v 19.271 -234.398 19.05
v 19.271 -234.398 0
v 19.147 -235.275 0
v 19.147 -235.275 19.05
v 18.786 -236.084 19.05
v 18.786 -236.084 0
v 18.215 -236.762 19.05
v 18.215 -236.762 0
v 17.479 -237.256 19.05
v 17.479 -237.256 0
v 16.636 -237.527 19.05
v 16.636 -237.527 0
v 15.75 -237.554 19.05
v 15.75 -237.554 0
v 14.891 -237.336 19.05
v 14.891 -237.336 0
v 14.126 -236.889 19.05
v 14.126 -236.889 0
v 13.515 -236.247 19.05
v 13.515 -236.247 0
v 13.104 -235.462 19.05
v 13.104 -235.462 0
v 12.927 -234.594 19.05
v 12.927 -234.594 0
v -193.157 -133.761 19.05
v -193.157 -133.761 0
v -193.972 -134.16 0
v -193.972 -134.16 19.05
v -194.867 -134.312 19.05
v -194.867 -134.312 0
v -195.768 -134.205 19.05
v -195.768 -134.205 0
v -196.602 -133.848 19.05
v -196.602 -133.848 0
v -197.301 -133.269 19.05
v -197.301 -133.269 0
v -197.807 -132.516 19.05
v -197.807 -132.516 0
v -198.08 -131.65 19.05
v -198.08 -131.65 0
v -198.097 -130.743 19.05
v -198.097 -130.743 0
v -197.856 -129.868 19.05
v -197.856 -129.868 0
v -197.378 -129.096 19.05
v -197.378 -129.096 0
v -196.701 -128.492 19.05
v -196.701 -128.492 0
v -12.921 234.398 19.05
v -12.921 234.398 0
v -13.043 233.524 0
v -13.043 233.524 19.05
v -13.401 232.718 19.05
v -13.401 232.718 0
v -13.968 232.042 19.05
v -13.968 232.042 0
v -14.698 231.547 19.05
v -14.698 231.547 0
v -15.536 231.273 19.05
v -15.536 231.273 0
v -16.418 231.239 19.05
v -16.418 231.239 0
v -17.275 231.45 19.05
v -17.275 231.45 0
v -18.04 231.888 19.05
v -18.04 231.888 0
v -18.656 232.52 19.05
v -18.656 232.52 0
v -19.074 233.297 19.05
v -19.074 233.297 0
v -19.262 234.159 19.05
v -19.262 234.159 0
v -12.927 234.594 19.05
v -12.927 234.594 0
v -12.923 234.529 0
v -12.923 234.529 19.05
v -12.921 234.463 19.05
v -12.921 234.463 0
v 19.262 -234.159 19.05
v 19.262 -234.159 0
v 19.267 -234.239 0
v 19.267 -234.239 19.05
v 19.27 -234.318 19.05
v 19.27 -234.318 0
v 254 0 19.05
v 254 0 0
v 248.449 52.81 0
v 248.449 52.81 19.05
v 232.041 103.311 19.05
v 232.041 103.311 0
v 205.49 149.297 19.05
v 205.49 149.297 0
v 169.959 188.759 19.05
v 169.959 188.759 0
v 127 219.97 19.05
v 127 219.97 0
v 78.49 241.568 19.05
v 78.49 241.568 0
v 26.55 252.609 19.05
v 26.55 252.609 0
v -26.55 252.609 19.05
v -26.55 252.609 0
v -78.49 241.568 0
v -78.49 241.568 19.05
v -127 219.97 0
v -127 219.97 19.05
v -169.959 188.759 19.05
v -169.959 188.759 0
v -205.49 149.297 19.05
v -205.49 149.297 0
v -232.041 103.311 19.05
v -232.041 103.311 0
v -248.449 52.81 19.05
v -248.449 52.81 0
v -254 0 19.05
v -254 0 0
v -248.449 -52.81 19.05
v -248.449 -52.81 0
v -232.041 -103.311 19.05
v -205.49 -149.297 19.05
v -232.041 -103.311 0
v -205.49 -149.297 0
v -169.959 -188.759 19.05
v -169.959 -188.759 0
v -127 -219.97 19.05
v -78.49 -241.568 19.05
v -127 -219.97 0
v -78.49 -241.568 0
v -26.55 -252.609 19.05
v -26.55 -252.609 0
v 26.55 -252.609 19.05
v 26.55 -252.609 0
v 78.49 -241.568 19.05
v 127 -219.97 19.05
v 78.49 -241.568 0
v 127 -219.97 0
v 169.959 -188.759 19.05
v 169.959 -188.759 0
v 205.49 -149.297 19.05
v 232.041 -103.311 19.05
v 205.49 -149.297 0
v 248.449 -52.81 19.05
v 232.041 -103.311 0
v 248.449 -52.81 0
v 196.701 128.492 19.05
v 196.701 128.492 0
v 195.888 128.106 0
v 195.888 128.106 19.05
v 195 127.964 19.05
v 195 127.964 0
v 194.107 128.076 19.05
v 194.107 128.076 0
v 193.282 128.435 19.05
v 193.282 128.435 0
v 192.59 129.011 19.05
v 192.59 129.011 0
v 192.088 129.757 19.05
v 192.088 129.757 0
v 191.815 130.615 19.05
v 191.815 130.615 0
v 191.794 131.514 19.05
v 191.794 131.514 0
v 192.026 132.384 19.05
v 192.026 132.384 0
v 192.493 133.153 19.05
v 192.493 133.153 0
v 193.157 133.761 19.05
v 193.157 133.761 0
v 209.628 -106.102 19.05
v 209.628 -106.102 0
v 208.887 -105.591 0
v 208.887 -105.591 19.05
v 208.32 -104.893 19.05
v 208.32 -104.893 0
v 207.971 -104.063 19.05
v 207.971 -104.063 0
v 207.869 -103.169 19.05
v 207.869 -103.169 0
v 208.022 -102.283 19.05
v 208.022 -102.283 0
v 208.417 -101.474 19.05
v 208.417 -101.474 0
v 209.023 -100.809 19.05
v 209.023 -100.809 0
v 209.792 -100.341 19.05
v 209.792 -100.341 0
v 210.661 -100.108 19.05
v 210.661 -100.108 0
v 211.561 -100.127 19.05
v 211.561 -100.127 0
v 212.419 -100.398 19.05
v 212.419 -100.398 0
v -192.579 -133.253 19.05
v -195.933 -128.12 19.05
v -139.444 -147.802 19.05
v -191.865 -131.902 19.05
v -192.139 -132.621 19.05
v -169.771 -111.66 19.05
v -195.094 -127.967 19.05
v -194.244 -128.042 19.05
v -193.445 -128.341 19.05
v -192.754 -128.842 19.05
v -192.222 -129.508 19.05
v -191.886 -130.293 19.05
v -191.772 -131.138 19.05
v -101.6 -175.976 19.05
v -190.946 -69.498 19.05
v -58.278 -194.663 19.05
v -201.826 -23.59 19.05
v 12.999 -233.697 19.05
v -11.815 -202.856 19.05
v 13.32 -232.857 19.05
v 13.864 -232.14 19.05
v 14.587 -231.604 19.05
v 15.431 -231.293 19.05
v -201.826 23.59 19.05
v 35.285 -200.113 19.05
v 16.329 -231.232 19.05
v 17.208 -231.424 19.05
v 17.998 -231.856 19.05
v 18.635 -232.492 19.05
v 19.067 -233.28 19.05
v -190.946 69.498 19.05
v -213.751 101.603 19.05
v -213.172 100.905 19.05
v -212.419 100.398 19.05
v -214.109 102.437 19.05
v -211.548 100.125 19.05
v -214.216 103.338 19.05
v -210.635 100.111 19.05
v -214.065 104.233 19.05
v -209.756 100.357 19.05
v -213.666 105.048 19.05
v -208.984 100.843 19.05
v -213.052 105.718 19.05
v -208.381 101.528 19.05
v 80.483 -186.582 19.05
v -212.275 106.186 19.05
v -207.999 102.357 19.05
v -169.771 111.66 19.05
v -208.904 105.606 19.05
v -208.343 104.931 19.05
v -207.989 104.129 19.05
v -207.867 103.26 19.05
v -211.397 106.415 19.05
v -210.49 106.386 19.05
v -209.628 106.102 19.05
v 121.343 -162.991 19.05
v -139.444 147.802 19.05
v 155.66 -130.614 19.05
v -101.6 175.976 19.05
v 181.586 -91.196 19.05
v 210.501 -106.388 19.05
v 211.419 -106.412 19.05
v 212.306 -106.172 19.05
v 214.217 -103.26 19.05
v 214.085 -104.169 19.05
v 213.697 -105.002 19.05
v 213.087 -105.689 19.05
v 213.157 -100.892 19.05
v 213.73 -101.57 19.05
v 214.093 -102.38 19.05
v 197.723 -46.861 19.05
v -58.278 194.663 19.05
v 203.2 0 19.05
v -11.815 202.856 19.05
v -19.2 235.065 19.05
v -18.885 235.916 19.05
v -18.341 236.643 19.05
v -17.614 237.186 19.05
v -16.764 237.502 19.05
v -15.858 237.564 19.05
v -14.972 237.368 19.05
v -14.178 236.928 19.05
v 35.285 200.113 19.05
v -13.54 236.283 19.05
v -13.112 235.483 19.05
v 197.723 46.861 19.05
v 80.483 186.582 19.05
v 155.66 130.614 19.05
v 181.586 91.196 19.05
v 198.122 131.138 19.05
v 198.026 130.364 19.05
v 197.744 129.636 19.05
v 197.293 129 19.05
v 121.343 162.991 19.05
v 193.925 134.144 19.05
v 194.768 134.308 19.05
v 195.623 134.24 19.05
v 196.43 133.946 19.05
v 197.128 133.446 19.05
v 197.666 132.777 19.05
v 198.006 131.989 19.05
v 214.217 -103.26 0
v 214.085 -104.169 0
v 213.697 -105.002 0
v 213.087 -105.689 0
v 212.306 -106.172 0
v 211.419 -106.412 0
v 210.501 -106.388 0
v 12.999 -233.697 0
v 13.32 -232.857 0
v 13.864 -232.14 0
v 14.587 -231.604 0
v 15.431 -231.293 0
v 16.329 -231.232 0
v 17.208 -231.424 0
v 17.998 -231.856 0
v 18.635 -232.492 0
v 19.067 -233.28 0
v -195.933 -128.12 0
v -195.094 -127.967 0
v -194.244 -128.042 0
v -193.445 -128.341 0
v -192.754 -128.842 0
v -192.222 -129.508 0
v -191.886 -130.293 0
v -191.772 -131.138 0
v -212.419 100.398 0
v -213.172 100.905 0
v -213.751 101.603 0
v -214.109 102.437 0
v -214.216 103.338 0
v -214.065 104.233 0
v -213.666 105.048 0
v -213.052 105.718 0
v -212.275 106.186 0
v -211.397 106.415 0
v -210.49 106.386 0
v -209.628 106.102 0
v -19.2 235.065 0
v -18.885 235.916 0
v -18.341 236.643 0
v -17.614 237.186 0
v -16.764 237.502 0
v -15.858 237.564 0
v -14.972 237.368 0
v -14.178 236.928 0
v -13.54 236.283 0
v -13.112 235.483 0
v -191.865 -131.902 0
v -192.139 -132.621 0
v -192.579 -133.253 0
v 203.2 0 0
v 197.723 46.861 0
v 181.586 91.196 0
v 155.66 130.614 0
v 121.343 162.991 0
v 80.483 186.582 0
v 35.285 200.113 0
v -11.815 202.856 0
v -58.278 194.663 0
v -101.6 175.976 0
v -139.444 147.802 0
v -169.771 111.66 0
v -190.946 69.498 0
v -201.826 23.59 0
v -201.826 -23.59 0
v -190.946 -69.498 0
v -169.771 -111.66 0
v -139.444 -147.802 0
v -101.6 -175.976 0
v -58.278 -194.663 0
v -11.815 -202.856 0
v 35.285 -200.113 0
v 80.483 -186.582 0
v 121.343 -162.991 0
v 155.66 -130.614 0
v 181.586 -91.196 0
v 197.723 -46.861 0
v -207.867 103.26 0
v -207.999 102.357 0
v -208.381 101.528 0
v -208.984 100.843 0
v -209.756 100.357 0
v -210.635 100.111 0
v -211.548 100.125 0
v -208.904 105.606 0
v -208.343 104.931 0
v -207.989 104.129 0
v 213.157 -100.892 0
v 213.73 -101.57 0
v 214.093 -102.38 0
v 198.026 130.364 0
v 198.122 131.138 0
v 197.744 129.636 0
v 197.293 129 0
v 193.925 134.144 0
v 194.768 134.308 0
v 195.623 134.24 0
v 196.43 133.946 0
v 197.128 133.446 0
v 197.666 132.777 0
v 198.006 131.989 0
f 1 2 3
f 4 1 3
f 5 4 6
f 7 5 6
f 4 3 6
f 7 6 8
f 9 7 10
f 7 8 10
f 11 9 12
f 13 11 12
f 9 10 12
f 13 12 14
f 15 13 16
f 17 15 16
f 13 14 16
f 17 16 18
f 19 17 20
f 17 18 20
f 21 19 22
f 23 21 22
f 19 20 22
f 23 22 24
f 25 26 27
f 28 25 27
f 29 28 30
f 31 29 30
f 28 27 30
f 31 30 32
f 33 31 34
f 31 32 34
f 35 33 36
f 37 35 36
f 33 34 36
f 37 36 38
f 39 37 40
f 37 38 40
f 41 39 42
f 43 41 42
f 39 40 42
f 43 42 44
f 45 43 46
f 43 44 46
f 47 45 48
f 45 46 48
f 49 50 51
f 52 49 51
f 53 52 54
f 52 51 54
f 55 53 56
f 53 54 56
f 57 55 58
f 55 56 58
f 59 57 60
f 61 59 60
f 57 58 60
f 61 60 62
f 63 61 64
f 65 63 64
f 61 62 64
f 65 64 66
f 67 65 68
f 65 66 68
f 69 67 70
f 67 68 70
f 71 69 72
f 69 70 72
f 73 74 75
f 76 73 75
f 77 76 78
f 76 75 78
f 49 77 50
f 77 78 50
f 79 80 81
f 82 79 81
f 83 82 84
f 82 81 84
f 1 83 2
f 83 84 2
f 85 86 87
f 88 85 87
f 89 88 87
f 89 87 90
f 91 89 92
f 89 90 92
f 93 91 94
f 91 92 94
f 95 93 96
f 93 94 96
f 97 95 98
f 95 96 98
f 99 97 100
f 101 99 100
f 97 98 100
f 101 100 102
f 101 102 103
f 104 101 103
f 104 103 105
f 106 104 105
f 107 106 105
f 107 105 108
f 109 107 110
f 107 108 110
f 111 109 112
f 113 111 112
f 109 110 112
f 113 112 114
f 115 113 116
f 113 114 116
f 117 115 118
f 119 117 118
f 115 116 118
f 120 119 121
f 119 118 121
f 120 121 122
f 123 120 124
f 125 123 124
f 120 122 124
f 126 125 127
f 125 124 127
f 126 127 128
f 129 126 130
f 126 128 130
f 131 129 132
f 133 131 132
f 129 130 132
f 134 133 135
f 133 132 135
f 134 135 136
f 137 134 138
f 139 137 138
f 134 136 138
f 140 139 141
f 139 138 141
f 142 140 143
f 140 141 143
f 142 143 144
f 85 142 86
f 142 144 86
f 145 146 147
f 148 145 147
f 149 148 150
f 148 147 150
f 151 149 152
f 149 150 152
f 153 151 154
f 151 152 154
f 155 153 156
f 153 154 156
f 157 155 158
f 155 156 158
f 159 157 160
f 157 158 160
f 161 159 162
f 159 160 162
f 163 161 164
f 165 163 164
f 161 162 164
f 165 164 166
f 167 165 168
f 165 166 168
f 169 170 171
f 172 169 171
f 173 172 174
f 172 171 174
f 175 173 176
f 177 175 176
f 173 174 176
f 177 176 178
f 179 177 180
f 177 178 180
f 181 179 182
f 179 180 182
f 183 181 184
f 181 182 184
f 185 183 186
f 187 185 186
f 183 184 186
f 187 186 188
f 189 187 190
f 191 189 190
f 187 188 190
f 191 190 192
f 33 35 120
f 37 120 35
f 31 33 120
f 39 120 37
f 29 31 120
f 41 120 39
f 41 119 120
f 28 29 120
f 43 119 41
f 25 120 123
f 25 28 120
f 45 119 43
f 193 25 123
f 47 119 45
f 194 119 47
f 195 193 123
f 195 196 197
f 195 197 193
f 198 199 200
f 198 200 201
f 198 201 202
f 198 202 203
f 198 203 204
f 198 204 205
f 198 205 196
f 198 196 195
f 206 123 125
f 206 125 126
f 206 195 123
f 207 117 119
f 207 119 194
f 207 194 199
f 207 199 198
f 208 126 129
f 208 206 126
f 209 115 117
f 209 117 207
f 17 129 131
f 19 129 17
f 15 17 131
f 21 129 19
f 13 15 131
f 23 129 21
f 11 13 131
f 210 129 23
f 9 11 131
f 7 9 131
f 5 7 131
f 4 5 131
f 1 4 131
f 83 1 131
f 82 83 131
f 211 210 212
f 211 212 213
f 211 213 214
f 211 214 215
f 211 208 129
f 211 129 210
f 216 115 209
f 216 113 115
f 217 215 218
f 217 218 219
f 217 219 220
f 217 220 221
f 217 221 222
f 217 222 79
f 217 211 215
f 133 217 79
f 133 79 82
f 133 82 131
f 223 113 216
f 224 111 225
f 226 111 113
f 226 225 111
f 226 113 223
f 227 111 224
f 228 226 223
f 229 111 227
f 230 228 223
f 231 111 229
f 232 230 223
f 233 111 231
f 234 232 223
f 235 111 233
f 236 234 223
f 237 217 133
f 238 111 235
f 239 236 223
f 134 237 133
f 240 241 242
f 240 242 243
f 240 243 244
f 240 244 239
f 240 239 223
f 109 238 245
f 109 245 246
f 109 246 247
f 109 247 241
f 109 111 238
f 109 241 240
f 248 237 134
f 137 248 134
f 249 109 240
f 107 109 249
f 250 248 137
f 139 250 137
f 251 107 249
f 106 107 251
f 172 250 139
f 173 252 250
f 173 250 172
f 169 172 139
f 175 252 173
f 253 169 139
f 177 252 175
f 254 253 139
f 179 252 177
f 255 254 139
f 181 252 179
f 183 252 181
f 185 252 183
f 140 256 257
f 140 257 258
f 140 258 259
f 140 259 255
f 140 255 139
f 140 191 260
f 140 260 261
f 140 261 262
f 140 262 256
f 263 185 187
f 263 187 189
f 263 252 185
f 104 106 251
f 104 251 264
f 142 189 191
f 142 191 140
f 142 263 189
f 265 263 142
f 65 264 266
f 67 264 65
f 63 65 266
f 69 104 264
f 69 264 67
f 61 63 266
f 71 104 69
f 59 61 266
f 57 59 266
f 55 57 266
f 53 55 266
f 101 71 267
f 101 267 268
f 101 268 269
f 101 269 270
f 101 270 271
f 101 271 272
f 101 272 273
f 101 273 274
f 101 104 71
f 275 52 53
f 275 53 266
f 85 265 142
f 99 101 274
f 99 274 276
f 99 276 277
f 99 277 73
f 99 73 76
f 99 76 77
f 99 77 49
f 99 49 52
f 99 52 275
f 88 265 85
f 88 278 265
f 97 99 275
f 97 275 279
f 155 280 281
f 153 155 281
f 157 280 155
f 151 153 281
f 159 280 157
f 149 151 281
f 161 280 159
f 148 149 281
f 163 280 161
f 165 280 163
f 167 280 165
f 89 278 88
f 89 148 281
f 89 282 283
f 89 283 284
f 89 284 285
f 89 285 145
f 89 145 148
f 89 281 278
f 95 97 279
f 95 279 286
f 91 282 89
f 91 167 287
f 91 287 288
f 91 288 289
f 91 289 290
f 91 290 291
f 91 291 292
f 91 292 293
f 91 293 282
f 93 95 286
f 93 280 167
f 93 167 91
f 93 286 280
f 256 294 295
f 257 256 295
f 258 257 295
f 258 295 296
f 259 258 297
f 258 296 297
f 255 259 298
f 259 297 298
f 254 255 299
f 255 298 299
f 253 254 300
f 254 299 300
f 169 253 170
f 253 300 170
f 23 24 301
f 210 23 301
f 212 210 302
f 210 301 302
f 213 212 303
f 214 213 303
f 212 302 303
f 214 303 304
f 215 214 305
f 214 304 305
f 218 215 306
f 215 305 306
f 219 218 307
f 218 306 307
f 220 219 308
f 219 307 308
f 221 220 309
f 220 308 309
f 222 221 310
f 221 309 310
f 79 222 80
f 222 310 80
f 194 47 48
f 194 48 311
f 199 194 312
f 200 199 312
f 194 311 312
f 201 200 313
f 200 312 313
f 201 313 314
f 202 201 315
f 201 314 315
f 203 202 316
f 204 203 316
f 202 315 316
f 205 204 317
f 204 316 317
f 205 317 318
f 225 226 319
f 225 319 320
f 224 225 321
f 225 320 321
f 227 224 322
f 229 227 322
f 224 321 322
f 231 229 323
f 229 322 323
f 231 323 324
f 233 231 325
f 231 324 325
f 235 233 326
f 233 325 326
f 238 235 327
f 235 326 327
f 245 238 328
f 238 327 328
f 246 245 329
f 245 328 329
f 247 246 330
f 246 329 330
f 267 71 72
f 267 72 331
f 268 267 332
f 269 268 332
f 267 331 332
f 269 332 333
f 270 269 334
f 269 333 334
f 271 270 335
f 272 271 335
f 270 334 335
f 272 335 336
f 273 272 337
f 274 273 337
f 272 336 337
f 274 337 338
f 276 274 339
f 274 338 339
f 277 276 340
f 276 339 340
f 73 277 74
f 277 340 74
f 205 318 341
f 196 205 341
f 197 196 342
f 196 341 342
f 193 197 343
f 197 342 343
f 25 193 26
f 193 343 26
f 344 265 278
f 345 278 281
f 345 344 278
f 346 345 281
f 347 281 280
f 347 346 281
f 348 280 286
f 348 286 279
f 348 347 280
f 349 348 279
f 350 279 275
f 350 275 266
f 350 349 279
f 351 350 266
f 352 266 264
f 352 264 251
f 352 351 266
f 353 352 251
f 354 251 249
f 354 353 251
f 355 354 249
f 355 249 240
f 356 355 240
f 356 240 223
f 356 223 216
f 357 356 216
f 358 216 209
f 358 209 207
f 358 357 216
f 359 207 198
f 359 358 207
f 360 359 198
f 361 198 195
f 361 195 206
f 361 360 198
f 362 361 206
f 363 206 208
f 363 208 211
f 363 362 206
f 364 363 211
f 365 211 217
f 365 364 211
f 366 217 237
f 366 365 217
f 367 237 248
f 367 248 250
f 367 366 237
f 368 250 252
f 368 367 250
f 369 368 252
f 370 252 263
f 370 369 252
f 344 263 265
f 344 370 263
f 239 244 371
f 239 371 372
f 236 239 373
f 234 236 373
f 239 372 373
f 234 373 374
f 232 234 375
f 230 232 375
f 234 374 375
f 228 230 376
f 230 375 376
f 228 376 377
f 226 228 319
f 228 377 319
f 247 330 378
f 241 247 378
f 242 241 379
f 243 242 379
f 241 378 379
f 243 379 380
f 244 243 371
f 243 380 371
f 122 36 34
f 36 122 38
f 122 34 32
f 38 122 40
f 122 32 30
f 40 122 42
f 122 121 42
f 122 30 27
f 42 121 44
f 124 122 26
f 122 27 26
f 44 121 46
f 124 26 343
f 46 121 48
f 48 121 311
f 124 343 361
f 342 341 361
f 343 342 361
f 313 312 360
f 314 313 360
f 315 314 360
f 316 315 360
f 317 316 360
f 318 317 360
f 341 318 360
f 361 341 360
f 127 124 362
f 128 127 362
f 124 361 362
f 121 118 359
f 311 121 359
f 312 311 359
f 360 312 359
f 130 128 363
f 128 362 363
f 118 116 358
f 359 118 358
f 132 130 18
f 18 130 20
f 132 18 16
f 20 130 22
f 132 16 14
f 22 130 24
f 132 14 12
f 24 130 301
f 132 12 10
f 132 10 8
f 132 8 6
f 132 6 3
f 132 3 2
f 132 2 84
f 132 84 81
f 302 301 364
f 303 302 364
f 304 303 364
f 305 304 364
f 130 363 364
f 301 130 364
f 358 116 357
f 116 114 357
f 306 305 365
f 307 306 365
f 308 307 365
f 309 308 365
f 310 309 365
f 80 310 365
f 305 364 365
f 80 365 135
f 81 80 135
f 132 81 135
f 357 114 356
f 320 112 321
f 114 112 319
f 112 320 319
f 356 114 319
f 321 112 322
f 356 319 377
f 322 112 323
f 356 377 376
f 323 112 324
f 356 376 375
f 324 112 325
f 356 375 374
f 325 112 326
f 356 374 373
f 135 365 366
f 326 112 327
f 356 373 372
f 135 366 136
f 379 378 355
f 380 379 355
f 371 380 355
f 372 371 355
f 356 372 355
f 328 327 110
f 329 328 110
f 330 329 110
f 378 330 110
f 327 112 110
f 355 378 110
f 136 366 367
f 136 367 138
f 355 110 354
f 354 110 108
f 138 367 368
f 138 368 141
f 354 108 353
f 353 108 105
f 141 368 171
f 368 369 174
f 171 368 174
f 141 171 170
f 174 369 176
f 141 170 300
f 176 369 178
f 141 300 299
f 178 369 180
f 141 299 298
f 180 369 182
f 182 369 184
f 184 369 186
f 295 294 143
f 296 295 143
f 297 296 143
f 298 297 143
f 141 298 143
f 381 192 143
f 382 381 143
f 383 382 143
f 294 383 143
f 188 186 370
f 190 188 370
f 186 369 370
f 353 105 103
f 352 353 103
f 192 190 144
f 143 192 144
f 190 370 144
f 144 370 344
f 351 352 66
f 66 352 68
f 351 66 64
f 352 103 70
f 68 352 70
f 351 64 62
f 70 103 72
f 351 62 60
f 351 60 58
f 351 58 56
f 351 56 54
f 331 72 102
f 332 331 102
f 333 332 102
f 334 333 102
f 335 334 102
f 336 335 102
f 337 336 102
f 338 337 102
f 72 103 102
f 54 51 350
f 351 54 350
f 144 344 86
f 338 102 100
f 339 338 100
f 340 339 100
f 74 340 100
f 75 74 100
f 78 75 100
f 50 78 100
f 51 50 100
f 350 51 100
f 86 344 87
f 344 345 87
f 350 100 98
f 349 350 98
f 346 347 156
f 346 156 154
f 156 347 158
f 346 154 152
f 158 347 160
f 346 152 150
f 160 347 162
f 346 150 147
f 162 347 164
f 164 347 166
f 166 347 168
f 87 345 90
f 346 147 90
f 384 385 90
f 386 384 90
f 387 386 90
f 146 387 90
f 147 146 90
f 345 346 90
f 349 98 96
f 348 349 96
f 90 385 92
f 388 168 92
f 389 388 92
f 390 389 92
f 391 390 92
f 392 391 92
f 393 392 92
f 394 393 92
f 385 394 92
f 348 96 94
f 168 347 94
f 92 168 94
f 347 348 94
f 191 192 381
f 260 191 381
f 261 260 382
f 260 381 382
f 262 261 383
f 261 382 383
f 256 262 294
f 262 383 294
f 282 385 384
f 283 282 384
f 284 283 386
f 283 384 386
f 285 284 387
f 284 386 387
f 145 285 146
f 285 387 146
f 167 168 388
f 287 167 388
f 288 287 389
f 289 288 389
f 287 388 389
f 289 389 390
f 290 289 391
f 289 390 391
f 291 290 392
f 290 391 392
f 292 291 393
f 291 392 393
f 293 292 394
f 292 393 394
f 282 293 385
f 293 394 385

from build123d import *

# Parameters (mm, degrees)
F0_R     = 254
F0_R_2   = 203.2
F1_DEPTH = 19.05


with BuildPart() as f1:
    # F0 (on Top) → F1 (new body)
    with BuildSketch(Plane.XY):
        Circle(F0_R)
        with BuildLine():
            ThreePointArc((196.7011125508, 128.4919251209), (225.1848450649, 67.0319927579), (234.95, 0))
            ThreePointArc((234.95, 0), (229.2479499847, -51.4478369596), (212.4185683948, -100.3984775836))
            ThreePointArc((212.4185683948, -100.3984775836), (213.7303800146, -101.5698688542), (214.2174677682, -103.259766116))
            ThreePointArc((214.2174677682, -103.259766116), (212.7141648851, -105.9590352298), (209.6278276113, -106.1021978612))
            ThreePointArc((209.6278276113, -106.1021978612), (131.1382553066, -194.9468145294), (19.2616521087, -234.1591152572))
            ThreePointArc((19.2616521087, -234.1591152572), (19.2684021583, -234.2784835874), (19.2706532388, -234.3980214226))
            ThreePointArc((19.2706532388, -234.3980214226), (16.1937508526, -237.5715056053), (12.9267150604, -234.5941229821))
            ThreePointArc((12.9267150604, -234.5941229821), (-103.259766116, -211.0424677682), (-193.1569162861, -133.7606376736))
            ThreePointArc((-193.1569162861, -133.7606376736), (-197.5812309419, -132.9103938918), (-196.7011125508, -128.4919251209))
            ThreePointArc((-196.7011125508, -128.4919251209), (-234.3980214226, -16.0956532388), (-212.4185683948, 100.3984775836))
            ThreePointArc((-212.4185683948, 100.3984775836), (-213.8943930083, 104.6551683608), (-209.6278276113, 106.1021978612))
            ThreePointArc((-209.6278276113, 106.1021978612), (-131.1382553066, 194.9468145294), (-19.2616521087, 234.1591152572))
            ThreePointArc((-19.2616521087, 234.1591152572), (-16.3131620664, 237.5655622526), (-12.9267150604, 234.5941229821))
            ThreePointArc((-12.9267150604, 234.5941229821), (103.259766116, 211.0424677682), (193.1569162861, 133.7606376736))
            ThreePointArc((193.1569162861, 133.7606376736), (196.4296661871, 133.9457053883), (198.1218145294, 131.1382553066))
            ThreePointArc((198.1218145294, 131.1382553066), (197.744181257, 129.6364682408), (196.7011125508, 128.4919251209))
        make_face(mode=Mode.SUBTRACT)
        with BuildLine():
            ThreePointArc((212.4185683948, -100.3984775836), (229.2479499847, -51.4478369596), (234.95, 0))
            ThreePointArc((234.95, 0), (225.1848450649, 67.0319927579), (196.7011125508, 128.4919251209))
            ThreePointArc((196.7011125508, 128.4919251209), (192.3123981168, 129.3661167214), (193.1569162861, 133.7606376736))
            ThreePointArc((193.1569162861, 133.7606376736), (103.259766116, 211.0424677682), (-12.9267150604, 234.5941229821))
            ThreePointArc((-12.9267150604, 234.5941229821), (-12.9221690561, 234.4961190364), (-12.9206532388, 234.3980214226))
            ThreePointArc((-12.9206532388, 234.3980214226), (-15.9761154036, 231.2252725031), (-19.2616521087, 234.1591152572))
            ThreePointArc((-19.2616521087, 234.1591152572), (-131.1382553066, 194.9468145294), (-209.6278276113, 106.1021978612))
            ThreePointArc((-209.6278276113, 106.1021978612), (-208.3431986543, 104.931463233), (-207.8674677682, 103.259766116))
            ThreePointArc((-207.8674677682, 103.259766116), (-209.3525705064, 100.5718538695), (-212.4185683948, 100.3984775836))
            ThreePointArc((-212.4185683948, 100.3984775836), (-234.3980214226, -16.0956532388), (-196.7011125508, -128.4919251209))
            ThreePointArc((-196.7011125508, -128.4919251209), (-193.4450274636, -128.3408885789), (-191.7718145294, -131.1382553066))
            ThreePointArc((-191.7718145294, -131.1382553066), (-192.1393644477, -132.6211069643), (-193.1569162861, -133.7606376736))
            ThreePointArc((-193.1569162861, -133.7606376736), (-103.259766116, -211.0424677682), (12.9267150604, -234.5941229821))
            ThreePointArc((12.9267150604, -234.5941229821), (15.8781444113, -231.2304805925), (19.2616521087, -234.1591152572))
            ThreePointArc((19.2616521087, -234.1591152572), (131.1382553066, -194.9468145294), (209.6278276113, -106.1021978612))
            ThreePointArc((209.6278276113, -106.1021978612), (208.190542528, -101.8643638712), (212.4185683948, -100.3984775836))
        make_face()
        Circle(F0_R_2, mode=Mode.SUBTRACT)
    extrude(amount=F1_DEPTH)


solid = f1.part
